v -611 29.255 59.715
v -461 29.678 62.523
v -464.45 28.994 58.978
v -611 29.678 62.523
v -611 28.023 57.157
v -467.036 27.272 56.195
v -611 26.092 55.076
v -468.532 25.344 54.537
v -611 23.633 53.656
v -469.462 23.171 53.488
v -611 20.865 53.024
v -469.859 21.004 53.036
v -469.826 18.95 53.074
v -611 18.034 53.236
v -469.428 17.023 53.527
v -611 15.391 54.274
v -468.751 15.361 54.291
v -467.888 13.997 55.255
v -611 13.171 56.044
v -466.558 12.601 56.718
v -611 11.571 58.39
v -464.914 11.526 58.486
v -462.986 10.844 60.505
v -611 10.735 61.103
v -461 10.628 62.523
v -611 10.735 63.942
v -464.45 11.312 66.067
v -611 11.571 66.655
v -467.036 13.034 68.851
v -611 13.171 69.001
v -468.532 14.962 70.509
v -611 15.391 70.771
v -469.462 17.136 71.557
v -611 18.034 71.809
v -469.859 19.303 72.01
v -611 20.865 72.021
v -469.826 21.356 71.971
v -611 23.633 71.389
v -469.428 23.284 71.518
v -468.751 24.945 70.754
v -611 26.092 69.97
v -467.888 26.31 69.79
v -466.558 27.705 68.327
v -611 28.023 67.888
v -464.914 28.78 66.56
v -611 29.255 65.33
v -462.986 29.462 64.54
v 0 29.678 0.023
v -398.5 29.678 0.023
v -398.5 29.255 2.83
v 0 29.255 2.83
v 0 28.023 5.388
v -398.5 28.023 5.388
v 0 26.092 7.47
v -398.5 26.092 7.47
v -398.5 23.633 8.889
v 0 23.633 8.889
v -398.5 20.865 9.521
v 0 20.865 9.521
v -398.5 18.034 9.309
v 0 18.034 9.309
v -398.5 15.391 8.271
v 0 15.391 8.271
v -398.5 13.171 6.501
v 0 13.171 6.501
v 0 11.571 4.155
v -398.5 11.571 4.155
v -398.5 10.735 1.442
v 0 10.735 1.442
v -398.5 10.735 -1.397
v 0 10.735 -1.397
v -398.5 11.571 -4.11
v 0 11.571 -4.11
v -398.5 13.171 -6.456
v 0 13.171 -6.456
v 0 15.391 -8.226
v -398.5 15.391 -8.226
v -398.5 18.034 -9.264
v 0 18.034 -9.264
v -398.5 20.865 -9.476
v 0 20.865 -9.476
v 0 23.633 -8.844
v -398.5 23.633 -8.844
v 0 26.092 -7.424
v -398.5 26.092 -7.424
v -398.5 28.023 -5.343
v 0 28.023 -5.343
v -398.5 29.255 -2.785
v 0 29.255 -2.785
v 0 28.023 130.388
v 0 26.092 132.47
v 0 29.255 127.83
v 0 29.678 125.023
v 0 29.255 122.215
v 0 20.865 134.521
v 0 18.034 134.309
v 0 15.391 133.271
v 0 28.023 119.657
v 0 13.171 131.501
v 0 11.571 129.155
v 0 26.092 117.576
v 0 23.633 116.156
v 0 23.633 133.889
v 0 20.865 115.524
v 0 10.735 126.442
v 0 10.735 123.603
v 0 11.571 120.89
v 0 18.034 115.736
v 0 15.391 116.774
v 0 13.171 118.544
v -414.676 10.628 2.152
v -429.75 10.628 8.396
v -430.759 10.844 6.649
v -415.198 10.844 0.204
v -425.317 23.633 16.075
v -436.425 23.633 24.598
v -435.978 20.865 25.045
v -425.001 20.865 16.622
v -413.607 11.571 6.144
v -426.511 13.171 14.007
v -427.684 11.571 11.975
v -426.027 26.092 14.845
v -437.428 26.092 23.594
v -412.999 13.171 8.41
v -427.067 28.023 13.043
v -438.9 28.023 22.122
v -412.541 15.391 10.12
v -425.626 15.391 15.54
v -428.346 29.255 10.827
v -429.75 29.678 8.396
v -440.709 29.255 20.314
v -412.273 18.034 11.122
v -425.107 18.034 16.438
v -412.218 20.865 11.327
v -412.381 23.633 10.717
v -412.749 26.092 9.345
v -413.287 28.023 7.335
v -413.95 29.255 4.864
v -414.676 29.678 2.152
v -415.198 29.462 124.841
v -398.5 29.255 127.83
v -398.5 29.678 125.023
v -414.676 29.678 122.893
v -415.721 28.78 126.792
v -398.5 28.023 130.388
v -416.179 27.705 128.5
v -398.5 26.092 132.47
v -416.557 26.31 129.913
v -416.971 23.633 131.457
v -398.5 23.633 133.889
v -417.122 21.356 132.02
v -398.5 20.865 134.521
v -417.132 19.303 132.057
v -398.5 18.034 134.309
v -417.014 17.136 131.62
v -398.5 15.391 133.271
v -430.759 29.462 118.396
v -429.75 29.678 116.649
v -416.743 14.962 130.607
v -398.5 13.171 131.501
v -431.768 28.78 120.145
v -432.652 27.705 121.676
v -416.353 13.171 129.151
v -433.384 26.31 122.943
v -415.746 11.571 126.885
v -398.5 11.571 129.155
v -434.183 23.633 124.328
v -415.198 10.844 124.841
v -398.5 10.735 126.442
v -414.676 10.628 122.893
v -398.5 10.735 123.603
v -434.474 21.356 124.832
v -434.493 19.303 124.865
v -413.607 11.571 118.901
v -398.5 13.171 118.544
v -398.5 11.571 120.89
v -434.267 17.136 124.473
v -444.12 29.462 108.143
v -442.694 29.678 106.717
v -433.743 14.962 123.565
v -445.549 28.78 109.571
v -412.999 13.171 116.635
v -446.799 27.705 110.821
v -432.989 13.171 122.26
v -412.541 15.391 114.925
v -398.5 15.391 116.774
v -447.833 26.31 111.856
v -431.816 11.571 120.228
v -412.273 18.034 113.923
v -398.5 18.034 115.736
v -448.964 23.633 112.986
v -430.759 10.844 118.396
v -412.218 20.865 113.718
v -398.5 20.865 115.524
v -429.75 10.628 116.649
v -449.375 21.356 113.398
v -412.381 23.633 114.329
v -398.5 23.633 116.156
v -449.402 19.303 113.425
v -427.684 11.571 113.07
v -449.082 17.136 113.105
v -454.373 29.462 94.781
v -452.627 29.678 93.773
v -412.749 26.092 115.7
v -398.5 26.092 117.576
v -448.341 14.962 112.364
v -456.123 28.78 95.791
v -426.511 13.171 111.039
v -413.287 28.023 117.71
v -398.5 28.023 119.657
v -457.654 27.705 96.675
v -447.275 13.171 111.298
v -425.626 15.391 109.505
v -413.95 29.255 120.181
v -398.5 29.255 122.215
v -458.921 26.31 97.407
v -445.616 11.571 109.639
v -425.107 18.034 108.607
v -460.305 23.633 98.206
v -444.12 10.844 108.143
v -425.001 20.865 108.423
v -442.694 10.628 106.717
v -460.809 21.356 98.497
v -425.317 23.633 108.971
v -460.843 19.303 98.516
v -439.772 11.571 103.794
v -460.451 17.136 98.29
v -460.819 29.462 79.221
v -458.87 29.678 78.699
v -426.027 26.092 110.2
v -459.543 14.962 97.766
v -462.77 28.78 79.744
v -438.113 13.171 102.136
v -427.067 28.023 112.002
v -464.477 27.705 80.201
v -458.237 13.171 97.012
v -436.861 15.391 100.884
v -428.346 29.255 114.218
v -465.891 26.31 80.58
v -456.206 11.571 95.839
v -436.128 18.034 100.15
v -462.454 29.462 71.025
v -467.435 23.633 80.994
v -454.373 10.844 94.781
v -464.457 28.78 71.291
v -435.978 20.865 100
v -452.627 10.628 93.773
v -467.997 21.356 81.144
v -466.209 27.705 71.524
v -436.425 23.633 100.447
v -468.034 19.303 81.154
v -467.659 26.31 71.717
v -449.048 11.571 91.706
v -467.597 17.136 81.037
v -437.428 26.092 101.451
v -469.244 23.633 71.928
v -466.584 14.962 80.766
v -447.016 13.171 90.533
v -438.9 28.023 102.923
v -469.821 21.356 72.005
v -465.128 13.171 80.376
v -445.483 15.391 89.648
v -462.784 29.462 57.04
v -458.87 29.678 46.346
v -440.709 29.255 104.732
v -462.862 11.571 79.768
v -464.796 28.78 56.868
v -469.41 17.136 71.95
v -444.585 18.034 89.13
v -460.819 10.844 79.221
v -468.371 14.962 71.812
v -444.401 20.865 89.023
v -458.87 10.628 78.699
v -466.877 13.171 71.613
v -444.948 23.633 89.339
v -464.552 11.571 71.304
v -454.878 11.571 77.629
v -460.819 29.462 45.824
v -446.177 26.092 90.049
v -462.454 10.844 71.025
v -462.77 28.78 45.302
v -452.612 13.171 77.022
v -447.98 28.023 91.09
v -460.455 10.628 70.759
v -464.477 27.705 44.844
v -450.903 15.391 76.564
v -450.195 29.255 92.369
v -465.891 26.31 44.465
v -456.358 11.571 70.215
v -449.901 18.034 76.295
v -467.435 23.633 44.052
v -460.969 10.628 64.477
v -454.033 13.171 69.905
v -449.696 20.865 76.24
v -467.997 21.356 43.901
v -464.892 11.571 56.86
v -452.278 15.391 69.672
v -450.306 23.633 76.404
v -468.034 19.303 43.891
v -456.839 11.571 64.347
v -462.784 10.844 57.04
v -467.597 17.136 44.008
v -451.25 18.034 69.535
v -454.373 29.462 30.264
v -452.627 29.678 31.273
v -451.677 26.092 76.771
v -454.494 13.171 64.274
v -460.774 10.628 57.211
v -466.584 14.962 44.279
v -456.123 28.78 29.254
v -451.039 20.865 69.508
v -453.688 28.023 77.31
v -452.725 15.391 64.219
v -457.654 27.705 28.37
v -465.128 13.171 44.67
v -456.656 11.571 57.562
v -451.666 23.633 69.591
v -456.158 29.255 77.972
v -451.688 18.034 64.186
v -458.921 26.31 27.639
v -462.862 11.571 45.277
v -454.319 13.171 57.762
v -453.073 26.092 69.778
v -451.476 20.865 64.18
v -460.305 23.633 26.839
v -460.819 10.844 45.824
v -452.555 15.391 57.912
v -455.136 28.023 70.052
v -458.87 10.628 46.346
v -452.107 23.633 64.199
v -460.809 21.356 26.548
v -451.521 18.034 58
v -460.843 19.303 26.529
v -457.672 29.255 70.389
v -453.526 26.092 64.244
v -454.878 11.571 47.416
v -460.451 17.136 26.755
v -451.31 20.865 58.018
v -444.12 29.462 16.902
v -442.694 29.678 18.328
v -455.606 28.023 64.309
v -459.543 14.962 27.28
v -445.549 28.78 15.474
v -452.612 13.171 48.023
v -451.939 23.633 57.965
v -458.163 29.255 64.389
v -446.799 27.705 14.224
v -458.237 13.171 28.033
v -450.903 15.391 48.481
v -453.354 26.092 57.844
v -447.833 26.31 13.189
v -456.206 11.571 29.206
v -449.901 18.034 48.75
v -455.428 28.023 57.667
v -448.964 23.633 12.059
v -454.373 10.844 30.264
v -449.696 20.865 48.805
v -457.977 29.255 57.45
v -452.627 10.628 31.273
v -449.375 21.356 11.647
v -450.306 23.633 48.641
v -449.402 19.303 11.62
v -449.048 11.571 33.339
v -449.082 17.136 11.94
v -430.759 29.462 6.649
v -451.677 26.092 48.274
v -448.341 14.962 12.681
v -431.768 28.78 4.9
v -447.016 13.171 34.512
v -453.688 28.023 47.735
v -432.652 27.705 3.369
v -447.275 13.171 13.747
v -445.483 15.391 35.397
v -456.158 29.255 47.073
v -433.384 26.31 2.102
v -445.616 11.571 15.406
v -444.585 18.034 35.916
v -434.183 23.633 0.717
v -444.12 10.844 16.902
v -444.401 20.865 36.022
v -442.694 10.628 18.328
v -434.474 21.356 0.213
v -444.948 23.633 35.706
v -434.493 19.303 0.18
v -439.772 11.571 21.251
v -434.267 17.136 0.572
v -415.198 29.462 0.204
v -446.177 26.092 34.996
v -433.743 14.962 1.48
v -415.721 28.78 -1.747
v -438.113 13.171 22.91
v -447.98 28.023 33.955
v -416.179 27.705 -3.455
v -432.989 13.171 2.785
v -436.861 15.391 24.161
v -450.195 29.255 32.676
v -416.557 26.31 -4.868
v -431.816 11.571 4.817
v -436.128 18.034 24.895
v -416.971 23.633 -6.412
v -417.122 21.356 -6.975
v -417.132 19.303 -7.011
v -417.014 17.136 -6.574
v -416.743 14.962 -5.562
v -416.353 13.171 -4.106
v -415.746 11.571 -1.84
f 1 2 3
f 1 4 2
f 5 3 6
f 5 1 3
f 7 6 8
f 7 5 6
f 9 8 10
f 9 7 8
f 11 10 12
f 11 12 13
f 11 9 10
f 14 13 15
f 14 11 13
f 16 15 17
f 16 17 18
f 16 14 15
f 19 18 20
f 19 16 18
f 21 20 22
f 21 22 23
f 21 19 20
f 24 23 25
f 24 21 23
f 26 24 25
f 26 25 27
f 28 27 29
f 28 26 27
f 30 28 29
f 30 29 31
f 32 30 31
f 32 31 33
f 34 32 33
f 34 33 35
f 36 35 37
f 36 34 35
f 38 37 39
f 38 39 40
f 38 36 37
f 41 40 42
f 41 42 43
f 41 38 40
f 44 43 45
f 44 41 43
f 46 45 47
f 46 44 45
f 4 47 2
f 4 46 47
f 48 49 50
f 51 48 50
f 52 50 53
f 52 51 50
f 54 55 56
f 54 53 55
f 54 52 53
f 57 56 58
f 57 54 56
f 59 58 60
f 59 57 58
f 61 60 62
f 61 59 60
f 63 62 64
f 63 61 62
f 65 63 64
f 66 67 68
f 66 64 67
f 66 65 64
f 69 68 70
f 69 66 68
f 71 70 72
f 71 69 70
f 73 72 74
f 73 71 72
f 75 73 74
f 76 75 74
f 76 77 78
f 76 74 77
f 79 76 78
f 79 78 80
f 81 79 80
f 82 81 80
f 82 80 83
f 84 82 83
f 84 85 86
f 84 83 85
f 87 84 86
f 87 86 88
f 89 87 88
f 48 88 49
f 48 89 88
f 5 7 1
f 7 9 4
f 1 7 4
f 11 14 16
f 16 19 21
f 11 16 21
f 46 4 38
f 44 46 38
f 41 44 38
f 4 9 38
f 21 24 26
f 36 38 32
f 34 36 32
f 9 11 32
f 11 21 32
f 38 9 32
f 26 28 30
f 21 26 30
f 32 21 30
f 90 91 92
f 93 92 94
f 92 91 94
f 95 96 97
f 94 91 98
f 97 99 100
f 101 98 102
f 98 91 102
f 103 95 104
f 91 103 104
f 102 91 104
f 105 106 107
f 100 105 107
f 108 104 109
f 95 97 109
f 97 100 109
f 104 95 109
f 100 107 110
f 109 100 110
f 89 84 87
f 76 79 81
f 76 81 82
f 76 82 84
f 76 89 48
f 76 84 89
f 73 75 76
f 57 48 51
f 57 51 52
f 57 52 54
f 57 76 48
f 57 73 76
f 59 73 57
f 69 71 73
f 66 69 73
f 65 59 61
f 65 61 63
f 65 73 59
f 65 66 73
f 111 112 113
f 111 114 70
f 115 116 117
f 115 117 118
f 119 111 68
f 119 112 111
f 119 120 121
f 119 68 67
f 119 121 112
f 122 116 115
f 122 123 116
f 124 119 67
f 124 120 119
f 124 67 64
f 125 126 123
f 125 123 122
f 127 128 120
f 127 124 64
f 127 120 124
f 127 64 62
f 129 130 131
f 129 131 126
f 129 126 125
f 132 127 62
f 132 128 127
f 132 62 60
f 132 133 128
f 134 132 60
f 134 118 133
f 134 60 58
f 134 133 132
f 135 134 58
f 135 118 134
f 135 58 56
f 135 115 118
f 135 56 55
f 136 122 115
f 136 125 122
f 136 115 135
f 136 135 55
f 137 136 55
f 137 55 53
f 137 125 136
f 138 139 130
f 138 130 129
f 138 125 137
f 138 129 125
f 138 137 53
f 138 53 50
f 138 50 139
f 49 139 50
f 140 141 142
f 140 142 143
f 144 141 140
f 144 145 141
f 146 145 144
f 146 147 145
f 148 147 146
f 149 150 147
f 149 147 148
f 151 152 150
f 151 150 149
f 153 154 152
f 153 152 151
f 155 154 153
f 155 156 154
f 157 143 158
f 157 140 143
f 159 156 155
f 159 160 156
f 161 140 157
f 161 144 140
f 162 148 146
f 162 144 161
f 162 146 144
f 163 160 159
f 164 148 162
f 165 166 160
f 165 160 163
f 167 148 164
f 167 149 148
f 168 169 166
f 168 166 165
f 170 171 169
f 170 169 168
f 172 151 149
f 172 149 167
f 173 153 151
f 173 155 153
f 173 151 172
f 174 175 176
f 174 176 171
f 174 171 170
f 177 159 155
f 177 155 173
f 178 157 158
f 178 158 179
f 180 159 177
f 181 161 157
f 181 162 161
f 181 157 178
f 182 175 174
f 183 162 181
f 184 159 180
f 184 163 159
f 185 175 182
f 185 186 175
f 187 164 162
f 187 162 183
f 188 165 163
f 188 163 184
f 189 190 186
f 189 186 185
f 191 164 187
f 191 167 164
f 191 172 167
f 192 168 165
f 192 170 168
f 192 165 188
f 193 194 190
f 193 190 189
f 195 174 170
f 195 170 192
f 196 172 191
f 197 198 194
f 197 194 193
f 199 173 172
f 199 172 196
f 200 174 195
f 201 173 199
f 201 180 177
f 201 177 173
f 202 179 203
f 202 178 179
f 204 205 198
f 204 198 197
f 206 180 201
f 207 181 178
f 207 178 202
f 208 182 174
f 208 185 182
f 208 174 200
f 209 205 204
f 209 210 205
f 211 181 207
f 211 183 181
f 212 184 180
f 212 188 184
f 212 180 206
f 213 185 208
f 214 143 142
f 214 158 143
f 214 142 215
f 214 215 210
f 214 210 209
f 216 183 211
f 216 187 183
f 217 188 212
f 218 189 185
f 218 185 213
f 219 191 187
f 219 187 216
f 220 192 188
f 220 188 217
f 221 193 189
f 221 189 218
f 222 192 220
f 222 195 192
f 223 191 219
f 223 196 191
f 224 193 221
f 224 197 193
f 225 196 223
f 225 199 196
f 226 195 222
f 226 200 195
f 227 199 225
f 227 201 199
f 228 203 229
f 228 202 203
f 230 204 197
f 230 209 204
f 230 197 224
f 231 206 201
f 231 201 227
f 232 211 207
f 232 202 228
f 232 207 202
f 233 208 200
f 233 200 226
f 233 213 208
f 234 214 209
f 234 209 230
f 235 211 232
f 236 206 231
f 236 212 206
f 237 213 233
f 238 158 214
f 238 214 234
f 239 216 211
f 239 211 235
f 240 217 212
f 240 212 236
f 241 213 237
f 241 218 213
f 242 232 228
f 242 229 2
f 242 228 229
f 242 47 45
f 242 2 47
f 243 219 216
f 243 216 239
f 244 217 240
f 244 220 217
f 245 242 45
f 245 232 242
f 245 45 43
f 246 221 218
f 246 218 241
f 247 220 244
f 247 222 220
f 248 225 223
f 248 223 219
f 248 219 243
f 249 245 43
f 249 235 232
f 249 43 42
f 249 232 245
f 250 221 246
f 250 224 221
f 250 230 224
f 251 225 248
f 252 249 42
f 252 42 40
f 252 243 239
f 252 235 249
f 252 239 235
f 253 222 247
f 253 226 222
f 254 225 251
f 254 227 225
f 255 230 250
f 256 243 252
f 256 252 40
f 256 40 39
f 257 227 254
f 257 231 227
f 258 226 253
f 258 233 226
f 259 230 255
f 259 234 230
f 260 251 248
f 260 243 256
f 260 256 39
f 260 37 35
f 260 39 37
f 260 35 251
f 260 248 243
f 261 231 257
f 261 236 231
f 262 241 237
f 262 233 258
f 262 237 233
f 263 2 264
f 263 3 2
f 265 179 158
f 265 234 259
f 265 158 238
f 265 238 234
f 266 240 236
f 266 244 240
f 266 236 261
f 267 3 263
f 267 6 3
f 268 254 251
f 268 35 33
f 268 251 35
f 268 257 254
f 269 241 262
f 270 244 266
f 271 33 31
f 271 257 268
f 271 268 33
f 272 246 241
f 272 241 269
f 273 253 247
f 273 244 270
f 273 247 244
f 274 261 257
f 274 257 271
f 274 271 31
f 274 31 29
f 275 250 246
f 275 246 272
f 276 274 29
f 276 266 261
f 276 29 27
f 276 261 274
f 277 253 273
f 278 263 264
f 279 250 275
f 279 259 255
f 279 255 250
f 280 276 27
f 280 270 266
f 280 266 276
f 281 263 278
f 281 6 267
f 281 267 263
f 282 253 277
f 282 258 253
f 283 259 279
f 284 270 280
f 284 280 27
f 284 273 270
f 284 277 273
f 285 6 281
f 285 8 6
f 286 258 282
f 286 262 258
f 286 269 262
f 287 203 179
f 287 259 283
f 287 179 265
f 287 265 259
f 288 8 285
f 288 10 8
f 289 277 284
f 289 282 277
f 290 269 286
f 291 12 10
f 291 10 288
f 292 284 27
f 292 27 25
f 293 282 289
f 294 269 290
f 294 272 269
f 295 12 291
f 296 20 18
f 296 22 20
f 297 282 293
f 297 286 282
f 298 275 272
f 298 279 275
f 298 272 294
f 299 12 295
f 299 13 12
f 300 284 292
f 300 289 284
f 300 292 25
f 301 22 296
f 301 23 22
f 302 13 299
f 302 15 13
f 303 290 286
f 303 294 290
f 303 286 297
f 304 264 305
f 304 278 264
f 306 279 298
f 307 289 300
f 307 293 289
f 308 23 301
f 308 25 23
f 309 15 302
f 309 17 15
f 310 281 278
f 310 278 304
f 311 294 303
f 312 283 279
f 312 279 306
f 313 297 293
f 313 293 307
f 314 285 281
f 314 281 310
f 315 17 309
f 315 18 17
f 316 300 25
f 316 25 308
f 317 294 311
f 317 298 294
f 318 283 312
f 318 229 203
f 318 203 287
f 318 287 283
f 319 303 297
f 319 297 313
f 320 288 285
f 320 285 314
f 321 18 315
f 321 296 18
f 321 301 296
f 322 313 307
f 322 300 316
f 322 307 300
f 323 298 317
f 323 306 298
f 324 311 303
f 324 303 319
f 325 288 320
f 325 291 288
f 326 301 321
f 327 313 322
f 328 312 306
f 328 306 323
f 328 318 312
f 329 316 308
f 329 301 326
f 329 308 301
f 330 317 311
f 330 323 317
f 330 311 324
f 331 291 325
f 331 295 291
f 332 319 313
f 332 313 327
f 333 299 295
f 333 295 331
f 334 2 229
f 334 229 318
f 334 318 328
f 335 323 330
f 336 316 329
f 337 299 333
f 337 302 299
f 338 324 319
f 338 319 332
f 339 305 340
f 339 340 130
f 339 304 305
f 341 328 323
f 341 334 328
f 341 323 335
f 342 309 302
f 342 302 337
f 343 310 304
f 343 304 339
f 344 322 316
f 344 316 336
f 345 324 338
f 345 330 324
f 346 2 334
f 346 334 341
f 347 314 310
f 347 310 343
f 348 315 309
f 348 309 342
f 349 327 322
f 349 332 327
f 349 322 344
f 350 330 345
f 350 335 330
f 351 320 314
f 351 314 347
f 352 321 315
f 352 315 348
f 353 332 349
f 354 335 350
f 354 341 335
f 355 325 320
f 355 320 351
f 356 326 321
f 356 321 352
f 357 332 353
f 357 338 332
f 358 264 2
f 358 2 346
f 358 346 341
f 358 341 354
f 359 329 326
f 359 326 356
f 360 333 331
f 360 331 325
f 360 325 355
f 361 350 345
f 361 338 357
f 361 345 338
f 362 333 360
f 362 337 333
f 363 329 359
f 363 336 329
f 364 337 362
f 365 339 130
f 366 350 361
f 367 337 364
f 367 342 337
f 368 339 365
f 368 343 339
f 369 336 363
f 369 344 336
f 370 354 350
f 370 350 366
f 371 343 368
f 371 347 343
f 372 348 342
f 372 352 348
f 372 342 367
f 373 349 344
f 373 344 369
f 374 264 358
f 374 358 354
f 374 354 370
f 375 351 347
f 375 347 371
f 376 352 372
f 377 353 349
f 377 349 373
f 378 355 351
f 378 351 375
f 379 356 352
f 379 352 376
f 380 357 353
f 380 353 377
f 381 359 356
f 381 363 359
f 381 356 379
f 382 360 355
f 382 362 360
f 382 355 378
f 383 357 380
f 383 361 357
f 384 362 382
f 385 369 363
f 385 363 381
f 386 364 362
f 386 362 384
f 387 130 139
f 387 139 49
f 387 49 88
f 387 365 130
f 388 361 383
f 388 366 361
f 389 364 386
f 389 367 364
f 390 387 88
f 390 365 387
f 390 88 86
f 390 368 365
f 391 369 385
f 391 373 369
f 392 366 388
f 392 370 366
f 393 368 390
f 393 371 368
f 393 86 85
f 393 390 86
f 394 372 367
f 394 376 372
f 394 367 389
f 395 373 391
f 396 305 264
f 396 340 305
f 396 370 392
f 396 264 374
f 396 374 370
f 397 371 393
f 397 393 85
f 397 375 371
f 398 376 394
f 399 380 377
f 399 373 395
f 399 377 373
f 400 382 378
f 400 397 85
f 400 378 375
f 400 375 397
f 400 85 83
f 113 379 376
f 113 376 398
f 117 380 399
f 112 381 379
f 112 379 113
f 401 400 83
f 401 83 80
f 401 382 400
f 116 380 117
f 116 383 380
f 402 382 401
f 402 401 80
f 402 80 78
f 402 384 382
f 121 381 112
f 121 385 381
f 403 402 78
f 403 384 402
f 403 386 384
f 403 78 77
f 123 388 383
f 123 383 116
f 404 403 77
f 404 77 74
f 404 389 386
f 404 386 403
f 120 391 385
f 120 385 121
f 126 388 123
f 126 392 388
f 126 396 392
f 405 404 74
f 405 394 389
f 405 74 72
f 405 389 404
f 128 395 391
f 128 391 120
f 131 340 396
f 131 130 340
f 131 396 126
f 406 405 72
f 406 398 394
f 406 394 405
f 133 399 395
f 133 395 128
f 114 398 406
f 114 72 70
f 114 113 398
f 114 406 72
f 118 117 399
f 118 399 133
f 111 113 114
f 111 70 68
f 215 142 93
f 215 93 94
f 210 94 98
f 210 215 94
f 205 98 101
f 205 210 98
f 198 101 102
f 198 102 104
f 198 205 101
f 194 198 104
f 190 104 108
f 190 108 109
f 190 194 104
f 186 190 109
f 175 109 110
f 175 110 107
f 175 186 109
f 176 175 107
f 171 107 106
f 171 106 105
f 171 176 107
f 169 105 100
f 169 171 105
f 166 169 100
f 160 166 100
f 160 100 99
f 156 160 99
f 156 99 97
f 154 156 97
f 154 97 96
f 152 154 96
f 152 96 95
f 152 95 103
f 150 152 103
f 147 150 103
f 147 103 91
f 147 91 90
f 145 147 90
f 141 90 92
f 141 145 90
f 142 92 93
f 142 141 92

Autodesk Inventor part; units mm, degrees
ref_plane "XZ Plane" through (0, 0, 0) normal (0, 1, 0) x (-1, 0, 0)
ref_plane "XY Plane" through (0, 0, 0) normal (0, 0, 1) x (1, 0, 0)
sketch "Sketch4" plane through (0, 0, 0) normal (1, 0, 0) x (0, 1, 0)
  circle A0 centre (20.1532, 0.0226) radius 9.525
  circle A1 centre (20.1532, 0.0226) radius 9.525
  dimension "d10" = 19.05
  dimension "d21" = 19.05
sketch "Sketch5" plane through (0, 0, 0) normal (0, 1, 0) x (-1, 0, 0)
  line L0 (0, 9.5476) -> (0, -9.5024) projected
  line L1 (398.5, 0.0226) -> (0, 0.0226)
  arc A0 (398.5, 0.0226) -> (398.5, 125.0226) centre (398.5, 62.5226) ccw
  line L2 (398.5, 62.5226) -> (398.5, 125.0226) construction
  line L3 (398.5, 62.5226) -> (398.5, 0.0226) construction
  line L4 (398.5, 125.0226) -> (0, 125.0226)
  line L5 (461, 62.5226) -> (611, 62.5226)
  dimension "d14" = 398.5
  dimension "d15" = 125
  dimension "d18" = 150
sweep "Sweep4" add profiles "Sketch4" path "Sketch5" path curves L1 A0 L4
ref_plane "Work Plane1" through (-461.6, 0, 0) normal (1, 0, 0) x (0, 1, 0)
sketch "Sketch8" plane through (-461.6, 0, 0) normal (1, 0, 0) x (0, 1, 0)
  circle A0 centre (20.1532, 125.0226) radius 9.525 projected
  circle A1 centre (20.1532, 0.0226) radius 9.525 projected
  line L0 (20.1532, 125.0226) -> (20.1532, 0.0226)
  circle A2 centre (20.1532, 62.5226) radius 9.525
  dimension "d24" = 19.05
sweep "Sweep5" add profiles "Sketch8" path "Sketch5" path curves L5 contours A2 L0 | L0 A2
properties part number "Y_ancla"
